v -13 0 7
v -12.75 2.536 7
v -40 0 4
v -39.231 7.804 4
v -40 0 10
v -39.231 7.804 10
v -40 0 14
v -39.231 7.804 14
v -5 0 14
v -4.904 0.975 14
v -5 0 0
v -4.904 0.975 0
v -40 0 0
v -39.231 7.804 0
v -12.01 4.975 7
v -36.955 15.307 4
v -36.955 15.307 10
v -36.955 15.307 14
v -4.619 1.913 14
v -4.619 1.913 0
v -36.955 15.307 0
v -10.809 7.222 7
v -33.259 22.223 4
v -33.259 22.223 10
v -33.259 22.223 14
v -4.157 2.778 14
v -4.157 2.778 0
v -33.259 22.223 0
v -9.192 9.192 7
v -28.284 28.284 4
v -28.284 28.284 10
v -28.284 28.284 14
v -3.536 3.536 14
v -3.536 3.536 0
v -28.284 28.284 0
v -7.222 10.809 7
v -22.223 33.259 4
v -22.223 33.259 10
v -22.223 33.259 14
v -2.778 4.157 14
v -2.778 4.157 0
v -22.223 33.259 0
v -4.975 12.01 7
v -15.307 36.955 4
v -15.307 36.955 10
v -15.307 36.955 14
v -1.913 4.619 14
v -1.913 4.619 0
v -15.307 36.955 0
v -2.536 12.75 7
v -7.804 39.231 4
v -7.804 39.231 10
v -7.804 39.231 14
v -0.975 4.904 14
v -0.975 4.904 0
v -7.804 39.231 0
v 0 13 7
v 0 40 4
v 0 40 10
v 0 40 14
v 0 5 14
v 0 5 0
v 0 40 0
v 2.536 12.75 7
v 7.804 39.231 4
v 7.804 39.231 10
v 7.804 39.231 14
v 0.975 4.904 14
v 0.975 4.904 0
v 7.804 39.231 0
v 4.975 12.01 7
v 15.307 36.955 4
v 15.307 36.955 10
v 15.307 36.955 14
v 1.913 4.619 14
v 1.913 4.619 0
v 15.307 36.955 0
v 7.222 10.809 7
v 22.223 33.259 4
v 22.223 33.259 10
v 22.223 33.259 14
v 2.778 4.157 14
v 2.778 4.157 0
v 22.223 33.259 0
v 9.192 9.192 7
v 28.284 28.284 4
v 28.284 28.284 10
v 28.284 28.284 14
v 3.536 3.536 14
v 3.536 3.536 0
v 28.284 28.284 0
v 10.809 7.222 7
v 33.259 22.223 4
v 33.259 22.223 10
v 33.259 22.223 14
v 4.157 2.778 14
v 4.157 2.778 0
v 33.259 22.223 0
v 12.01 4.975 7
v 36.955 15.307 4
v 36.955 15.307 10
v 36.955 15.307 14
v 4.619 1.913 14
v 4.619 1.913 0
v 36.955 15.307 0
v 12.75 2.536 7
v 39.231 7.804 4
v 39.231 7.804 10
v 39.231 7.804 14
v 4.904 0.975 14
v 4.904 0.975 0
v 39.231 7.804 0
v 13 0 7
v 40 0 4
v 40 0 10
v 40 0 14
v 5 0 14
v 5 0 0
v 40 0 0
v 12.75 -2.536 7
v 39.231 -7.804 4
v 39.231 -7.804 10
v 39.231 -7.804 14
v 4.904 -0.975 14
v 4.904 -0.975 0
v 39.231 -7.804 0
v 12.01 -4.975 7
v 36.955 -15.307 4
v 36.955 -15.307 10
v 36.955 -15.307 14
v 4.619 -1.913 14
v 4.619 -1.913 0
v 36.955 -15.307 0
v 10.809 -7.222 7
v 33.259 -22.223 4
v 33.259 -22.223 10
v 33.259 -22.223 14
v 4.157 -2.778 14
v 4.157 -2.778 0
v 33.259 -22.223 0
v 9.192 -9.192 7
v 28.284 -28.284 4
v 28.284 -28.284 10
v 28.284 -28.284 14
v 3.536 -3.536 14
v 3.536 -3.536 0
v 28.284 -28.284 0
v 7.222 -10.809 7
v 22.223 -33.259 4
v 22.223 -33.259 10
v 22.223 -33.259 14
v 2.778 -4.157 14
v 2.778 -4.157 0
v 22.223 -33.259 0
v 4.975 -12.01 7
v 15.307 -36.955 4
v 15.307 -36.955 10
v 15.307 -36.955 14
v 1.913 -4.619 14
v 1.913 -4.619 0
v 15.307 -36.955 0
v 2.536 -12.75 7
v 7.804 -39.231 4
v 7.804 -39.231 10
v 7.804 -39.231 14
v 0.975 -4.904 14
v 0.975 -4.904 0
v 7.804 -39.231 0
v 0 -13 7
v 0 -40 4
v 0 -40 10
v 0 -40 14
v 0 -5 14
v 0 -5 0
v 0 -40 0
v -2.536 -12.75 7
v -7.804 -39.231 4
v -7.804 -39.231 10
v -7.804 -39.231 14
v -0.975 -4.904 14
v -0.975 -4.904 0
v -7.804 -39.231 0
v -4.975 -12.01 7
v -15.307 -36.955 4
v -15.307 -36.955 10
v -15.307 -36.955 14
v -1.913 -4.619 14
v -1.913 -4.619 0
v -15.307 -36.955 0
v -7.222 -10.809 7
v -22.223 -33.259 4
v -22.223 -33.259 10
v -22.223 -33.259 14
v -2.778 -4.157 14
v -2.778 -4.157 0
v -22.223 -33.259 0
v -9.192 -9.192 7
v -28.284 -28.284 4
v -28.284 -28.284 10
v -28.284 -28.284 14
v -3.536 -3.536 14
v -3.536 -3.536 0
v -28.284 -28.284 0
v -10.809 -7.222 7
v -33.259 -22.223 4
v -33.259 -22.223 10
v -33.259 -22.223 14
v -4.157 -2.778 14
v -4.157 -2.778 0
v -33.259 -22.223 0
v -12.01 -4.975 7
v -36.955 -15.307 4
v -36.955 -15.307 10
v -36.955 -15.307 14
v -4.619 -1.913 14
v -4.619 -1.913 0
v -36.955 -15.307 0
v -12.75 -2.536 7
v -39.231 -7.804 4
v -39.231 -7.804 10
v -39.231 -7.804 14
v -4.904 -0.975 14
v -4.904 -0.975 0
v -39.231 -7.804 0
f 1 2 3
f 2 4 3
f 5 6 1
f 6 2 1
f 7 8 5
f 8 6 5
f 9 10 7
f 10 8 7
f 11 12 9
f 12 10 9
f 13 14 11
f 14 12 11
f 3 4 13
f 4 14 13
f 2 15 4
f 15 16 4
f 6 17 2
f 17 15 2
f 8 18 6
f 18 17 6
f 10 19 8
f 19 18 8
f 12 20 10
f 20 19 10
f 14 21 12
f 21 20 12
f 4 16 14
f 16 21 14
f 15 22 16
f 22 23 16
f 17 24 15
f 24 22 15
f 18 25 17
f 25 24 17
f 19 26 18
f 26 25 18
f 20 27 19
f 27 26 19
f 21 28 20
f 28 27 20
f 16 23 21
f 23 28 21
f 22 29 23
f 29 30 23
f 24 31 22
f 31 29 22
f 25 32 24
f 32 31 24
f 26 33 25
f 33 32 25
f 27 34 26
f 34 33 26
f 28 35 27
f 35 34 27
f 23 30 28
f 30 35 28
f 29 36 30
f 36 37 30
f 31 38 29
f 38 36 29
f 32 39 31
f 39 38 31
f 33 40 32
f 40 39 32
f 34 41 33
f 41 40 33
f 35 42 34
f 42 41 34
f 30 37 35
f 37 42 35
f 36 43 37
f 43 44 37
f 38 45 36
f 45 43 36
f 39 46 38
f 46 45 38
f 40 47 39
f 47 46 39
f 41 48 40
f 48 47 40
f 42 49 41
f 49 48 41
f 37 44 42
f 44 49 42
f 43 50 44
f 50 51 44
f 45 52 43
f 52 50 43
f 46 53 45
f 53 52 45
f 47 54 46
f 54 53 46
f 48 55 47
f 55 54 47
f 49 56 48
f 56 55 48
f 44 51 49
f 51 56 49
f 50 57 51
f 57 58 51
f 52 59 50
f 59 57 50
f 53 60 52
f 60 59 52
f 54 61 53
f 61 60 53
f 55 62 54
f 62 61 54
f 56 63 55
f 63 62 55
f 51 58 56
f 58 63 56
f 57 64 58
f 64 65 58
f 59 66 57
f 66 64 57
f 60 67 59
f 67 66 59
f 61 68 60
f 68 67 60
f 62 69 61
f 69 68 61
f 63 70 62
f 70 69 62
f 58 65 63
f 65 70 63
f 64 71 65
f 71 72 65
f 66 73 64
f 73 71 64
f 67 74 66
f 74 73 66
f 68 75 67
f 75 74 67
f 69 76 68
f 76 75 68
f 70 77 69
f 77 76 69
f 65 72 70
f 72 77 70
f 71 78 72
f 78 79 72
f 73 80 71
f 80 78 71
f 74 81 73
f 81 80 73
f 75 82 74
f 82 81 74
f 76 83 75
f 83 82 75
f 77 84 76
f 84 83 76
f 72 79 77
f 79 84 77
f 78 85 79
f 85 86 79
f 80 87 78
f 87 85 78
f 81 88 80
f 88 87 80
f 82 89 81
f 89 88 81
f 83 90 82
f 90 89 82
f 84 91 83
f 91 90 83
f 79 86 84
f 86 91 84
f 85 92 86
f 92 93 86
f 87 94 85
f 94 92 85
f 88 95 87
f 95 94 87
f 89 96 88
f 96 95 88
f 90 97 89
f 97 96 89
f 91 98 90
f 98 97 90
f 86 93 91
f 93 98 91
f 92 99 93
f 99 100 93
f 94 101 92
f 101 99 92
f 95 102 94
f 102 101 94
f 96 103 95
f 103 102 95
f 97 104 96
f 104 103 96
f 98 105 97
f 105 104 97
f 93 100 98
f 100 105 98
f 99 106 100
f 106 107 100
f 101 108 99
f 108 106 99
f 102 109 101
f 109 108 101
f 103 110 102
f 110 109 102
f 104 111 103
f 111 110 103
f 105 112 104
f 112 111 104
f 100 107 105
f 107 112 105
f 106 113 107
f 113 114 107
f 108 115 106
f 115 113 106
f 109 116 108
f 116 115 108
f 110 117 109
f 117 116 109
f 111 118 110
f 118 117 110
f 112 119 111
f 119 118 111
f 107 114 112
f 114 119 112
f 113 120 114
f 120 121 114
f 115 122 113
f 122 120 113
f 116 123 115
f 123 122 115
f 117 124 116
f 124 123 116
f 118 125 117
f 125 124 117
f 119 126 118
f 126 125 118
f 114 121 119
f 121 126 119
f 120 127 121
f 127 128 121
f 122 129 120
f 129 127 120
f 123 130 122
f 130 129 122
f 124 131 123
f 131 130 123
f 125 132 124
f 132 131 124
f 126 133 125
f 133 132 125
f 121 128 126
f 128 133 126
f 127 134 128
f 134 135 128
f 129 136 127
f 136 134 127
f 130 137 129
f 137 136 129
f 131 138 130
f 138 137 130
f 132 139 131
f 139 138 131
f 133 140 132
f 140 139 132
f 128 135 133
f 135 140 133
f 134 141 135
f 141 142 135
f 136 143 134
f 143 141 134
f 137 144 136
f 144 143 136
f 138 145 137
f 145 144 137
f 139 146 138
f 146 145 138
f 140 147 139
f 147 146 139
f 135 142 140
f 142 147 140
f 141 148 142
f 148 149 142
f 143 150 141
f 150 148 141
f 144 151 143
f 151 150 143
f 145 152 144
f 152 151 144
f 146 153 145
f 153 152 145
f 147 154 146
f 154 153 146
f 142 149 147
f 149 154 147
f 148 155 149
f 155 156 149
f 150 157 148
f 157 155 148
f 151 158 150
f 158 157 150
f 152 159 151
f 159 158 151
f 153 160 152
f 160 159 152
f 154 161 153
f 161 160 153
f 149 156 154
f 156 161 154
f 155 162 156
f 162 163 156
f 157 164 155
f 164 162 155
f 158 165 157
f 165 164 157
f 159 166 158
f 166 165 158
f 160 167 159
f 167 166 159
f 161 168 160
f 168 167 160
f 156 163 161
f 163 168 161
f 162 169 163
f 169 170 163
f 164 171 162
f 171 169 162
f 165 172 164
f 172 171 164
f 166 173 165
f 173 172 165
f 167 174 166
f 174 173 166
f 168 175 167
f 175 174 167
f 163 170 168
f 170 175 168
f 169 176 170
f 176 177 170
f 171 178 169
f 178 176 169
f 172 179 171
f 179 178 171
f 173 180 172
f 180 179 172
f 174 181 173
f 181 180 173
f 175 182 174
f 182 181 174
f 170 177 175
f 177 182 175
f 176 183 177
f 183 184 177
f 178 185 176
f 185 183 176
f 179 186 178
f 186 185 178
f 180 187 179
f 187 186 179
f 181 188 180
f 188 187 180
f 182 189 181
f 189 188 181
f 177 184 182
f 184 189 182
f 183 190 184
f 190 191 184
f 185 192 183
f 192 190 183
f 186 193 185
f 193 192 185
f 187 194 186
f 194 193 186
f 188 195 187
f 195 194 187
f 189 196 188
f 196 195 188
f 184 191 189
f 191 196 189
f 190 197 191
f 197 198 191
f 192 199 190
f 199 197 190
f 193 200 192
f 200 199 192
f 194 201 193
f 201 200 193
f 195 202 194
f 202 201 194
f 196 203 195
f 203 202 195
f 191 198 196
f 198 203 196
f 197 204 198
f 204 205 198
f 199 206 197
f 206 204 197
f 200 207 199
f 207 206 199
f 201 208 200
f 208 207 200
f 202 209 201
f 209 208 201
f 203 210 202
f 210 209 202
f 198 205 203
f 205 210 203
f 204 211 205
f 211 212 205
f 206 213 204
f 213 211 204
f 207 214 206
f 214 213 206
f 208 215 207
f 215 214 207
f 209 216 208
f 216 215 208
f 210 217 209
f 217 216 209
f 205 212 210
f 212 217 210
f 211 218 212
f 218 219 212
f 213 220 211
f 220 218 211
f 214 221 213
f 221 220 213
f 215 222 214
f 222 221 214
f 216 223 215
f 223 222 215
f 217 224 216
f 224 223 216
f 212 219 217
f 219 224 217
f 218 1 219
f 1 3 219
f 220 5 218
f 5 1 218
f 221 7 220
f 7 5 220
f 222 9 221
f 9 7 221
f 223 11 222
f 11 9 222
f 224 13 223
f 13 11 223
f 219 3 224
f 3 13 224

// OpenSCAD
$fn = 32;

// ----------------------------------------------------------------------
// Revolved part: V-groove pulley R40
// ----------------------------------------------------------------------

// --- parameters (mm) ---
bore_r = 5;               // bore radius
rim_r = 40;               // rim radius
rim_t = 14;               // rim width
groove_r = 13;            // groove root radius
groove_w = 3;             // groove half width
revolve_angle = 360;      // revolve sweep, degrees

bore_d = 2 * bore_r;
rim_d = 2 * rim_r;
groove_d = 2 * groove_r;

profile = [[5, 0], [40, 0], [40, 4], [13, 7], [40, 10], [40, 14], [5, 14]];  // primary outline, 7 points, counter clockwise

// --- the one profile operation ---
rotate_extrude(angle = revolve_angle) polygon(points = profile);
